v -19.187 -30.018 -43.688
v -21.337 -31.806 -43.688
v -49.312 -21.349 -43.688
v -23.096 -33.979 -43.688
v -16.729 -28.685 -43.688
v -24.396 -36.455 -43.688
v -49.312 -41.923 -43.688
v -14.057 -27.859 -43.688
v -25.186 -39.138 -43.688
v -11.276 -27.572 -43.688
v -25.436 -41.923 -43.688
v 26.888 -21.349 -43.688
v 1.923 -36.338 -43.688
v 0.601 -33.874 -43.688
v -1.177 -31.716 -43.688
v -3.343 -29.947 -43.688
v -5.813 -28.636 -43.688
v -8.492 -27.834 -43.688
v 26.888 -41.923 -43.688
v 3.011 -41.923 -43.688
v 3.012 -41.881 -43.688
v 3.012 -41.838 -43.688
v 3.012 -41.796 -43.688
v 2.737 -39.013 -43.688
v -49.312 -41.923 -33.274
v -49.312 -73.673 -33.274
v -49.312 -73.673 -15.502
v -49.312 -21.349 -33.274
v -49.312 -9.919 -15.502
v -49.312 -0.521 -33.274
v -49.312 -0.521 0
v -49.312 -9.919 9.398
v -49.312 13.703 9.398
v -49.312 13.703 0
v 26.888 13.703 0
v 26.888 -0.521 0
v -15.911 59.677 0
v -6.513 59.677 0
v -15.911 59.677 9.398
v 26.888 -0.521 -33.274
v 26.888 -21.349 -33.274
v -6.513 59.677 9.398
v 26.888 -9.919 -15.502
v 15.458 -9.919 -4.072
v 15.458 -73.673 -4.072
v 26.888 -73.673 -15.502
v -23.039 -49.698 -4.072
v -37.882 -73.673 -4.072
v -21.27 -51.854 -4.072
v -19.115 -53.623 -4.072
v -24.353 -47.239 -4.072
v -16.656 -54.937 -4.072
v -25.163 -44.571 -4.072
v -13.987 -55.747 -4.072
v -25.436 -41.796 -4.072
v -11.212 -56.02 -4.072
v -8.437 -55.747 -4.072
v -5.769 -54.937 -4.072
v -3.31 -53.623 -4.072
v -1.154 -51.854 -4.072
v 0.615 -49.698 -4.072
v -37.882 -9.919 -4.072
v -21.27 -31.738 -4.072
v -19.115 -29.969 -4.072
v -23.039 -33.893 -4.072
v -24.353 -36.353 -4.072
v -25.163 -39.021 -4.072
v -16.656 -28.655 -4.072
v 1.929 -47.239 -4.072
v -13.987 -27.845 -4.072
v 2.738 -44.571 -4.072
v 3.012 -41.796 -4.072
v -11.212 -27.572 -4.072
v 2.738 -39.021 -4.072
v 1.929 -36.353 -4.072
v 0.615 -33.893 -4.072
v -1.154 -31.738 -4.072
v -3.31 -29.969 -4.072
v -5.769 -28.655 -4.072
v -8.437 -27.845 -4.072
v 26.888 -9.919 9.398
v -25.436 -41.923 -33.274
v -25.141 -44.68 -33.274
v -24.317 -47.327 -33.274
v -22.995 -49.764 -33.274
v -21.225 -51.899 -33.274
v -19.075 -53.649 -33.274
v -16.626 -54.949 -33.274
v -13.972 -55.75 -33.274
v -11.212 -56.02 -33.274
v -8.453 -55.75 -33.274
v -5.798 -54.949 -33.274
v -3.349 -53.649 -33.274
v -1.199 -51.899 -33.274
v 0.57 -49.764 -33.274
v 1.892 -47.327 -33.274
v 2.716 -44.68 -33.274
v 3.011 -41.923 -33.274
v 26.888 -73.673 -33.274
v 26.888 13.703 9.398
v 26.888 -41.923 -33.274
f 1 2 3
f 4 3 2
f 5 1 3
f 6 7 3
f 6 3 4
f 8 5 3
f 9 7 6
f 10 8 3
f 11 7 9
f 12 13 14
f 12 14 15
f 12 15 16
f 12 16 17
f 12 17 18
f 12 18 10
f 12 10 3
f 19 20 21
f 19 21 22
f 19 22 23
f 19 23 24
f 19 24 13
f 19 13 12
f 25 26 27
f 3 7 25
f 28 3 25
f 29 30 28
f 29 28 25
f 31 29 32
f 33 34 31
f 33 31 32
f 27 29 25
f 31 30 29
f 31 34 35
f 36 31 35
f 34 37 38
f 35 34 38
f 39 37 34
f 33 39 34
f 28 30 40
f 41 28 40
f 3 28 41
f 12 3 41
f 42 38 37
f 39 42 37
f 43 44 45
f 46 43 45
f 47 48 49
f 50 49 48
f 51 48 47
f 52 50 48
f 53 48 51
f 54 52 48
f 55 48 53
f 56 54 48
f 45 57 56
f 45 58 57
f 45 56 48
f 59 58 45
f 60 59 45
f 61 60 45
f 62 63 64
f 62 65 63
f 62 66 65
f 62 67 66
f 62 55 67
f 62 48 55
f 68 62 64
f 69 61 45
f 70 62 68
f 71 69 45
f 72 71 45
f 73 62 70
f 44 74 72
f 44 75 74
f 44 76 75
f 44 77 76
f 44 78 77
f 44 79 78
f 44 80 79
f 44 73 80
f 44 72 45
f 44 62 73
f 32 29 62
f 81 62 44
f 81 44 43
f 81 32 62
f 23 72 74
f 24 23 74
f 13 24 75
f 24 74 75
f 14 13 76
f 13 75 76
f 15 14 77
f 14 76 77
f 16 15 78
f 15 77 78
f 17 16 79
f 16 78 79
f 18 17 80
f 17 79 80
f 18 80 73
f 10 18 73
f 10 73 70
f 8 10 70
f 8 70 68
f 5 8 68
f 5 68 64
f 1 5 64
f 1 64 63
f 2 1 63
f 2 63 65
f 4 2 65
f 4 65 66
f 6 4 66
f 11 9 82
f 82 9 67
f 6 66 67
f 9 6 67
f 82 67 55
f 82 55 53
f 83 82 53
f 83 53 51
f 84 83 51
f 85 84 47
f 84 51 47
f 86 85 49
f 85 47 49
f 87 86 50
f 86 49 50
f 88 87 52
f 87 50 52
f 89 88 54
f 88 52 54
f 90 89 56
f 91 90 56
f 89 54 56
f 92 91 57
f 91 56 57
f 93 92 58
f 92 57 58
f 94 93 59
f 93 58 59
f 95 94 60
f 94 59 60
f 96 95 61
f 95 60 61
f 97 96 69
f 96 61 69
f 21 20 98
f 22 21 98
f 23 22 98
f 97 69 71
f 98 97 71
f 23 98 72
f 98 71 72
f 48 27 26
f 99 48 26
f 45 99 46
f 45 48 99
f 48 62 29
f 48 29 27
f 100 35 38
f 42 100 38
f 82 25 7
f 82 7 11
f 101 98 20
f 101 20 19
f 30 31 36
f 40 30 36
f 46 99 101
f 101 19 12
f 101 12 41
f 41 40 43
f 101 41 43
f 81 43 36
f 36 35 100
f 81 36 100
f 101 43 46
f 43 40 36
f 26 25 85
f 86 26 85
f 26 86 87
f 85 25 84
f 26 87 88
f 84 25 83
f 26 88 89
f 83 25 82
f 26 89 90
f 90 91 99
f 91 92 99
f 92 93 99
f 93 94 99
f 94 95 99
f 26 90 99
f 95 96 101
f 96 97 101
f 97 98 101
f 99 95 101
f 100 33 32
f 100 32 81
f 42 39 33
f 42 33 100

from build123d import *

# Parameters (mm, degrees)
F1_DEPTH  = 9.398
F2_W      = 76.2
F2_H      = 33.274
F3_DEPTH  = 9.398
F4_W      = 76.2
F4_H      = 29.2016597947
F5_DEPTH  = 63.754
F6_SIZE   = 11.43
F7_W      = 76.2
F7_H      = 20.574
F8_DEPTH  = 10.414
F9_R      = 14.224
F10_DEPTH = 221.488


with BuildPart() as f1:
    # F0 (on Top) → F1 (new body)
    with BuildSketch(Plane.XY):
        Polygon((-49.3122338645, 13.7030885327), (-49.3122338645, -9.9189114673), (26.8877661355, -9.9189114673), (26.8877661355, 13.7030885327), (-6.5132338645, 59.6770885327), (-15.9112338645, 59.6770885327), align=None)
    extrude(amount=F1_DEPTH)

    # F2 (on face) → F3 (join)
    with BuildSketch(Plane.XZ.offset(9.9189114673)):
        with Locations((-11.2122338645, -16.637)):
            Rectangle(F2_W, F2_H)
    extrude(amount=-F3_DEPTH)

    # F4 (on face) → F5 (join)
    with BuildSketch(Plane.XZ.offset(9.9189114673)):
        with Locations((-11.2122338645, -18.6731701027)):
            Rectangle(F4_W, F4_H)
    extrude(amount=F5_DEPTH)

    # F6
    f6_edges = [f1.edges().sort_by_distance(p)[0] for p in [
        (26.887766, -41.795911, -4.07234),
        (-49.312234, -41.795911, -4.07234),
    ]]
    chamfer(f6_edges, length=F6_SIZE)

    # F7 (on face) → F8 (join)
    with BuildSketch(Plane(origin=(0, 0, -33.274), x_dir=(1, 0, 0), z_dir=(0, 0, -1))):
        with Locations((-11.2122338645, 31.6359114673)):
            Rectangle(F7_W, F7_H)
    extrude(amount=F8_DEPTH)

    # F9 (on face) → F10 (cut)
    with BuildSketch(Plane.XY.offset(-4.0723402053)):
        with Locations((-11.2122338645, -41.7959114673)):
            Circle(F9_R)
    extrude(amount=-F10_DEPTH, mode=Mode.SUBTRACT)


solid = f1.part
